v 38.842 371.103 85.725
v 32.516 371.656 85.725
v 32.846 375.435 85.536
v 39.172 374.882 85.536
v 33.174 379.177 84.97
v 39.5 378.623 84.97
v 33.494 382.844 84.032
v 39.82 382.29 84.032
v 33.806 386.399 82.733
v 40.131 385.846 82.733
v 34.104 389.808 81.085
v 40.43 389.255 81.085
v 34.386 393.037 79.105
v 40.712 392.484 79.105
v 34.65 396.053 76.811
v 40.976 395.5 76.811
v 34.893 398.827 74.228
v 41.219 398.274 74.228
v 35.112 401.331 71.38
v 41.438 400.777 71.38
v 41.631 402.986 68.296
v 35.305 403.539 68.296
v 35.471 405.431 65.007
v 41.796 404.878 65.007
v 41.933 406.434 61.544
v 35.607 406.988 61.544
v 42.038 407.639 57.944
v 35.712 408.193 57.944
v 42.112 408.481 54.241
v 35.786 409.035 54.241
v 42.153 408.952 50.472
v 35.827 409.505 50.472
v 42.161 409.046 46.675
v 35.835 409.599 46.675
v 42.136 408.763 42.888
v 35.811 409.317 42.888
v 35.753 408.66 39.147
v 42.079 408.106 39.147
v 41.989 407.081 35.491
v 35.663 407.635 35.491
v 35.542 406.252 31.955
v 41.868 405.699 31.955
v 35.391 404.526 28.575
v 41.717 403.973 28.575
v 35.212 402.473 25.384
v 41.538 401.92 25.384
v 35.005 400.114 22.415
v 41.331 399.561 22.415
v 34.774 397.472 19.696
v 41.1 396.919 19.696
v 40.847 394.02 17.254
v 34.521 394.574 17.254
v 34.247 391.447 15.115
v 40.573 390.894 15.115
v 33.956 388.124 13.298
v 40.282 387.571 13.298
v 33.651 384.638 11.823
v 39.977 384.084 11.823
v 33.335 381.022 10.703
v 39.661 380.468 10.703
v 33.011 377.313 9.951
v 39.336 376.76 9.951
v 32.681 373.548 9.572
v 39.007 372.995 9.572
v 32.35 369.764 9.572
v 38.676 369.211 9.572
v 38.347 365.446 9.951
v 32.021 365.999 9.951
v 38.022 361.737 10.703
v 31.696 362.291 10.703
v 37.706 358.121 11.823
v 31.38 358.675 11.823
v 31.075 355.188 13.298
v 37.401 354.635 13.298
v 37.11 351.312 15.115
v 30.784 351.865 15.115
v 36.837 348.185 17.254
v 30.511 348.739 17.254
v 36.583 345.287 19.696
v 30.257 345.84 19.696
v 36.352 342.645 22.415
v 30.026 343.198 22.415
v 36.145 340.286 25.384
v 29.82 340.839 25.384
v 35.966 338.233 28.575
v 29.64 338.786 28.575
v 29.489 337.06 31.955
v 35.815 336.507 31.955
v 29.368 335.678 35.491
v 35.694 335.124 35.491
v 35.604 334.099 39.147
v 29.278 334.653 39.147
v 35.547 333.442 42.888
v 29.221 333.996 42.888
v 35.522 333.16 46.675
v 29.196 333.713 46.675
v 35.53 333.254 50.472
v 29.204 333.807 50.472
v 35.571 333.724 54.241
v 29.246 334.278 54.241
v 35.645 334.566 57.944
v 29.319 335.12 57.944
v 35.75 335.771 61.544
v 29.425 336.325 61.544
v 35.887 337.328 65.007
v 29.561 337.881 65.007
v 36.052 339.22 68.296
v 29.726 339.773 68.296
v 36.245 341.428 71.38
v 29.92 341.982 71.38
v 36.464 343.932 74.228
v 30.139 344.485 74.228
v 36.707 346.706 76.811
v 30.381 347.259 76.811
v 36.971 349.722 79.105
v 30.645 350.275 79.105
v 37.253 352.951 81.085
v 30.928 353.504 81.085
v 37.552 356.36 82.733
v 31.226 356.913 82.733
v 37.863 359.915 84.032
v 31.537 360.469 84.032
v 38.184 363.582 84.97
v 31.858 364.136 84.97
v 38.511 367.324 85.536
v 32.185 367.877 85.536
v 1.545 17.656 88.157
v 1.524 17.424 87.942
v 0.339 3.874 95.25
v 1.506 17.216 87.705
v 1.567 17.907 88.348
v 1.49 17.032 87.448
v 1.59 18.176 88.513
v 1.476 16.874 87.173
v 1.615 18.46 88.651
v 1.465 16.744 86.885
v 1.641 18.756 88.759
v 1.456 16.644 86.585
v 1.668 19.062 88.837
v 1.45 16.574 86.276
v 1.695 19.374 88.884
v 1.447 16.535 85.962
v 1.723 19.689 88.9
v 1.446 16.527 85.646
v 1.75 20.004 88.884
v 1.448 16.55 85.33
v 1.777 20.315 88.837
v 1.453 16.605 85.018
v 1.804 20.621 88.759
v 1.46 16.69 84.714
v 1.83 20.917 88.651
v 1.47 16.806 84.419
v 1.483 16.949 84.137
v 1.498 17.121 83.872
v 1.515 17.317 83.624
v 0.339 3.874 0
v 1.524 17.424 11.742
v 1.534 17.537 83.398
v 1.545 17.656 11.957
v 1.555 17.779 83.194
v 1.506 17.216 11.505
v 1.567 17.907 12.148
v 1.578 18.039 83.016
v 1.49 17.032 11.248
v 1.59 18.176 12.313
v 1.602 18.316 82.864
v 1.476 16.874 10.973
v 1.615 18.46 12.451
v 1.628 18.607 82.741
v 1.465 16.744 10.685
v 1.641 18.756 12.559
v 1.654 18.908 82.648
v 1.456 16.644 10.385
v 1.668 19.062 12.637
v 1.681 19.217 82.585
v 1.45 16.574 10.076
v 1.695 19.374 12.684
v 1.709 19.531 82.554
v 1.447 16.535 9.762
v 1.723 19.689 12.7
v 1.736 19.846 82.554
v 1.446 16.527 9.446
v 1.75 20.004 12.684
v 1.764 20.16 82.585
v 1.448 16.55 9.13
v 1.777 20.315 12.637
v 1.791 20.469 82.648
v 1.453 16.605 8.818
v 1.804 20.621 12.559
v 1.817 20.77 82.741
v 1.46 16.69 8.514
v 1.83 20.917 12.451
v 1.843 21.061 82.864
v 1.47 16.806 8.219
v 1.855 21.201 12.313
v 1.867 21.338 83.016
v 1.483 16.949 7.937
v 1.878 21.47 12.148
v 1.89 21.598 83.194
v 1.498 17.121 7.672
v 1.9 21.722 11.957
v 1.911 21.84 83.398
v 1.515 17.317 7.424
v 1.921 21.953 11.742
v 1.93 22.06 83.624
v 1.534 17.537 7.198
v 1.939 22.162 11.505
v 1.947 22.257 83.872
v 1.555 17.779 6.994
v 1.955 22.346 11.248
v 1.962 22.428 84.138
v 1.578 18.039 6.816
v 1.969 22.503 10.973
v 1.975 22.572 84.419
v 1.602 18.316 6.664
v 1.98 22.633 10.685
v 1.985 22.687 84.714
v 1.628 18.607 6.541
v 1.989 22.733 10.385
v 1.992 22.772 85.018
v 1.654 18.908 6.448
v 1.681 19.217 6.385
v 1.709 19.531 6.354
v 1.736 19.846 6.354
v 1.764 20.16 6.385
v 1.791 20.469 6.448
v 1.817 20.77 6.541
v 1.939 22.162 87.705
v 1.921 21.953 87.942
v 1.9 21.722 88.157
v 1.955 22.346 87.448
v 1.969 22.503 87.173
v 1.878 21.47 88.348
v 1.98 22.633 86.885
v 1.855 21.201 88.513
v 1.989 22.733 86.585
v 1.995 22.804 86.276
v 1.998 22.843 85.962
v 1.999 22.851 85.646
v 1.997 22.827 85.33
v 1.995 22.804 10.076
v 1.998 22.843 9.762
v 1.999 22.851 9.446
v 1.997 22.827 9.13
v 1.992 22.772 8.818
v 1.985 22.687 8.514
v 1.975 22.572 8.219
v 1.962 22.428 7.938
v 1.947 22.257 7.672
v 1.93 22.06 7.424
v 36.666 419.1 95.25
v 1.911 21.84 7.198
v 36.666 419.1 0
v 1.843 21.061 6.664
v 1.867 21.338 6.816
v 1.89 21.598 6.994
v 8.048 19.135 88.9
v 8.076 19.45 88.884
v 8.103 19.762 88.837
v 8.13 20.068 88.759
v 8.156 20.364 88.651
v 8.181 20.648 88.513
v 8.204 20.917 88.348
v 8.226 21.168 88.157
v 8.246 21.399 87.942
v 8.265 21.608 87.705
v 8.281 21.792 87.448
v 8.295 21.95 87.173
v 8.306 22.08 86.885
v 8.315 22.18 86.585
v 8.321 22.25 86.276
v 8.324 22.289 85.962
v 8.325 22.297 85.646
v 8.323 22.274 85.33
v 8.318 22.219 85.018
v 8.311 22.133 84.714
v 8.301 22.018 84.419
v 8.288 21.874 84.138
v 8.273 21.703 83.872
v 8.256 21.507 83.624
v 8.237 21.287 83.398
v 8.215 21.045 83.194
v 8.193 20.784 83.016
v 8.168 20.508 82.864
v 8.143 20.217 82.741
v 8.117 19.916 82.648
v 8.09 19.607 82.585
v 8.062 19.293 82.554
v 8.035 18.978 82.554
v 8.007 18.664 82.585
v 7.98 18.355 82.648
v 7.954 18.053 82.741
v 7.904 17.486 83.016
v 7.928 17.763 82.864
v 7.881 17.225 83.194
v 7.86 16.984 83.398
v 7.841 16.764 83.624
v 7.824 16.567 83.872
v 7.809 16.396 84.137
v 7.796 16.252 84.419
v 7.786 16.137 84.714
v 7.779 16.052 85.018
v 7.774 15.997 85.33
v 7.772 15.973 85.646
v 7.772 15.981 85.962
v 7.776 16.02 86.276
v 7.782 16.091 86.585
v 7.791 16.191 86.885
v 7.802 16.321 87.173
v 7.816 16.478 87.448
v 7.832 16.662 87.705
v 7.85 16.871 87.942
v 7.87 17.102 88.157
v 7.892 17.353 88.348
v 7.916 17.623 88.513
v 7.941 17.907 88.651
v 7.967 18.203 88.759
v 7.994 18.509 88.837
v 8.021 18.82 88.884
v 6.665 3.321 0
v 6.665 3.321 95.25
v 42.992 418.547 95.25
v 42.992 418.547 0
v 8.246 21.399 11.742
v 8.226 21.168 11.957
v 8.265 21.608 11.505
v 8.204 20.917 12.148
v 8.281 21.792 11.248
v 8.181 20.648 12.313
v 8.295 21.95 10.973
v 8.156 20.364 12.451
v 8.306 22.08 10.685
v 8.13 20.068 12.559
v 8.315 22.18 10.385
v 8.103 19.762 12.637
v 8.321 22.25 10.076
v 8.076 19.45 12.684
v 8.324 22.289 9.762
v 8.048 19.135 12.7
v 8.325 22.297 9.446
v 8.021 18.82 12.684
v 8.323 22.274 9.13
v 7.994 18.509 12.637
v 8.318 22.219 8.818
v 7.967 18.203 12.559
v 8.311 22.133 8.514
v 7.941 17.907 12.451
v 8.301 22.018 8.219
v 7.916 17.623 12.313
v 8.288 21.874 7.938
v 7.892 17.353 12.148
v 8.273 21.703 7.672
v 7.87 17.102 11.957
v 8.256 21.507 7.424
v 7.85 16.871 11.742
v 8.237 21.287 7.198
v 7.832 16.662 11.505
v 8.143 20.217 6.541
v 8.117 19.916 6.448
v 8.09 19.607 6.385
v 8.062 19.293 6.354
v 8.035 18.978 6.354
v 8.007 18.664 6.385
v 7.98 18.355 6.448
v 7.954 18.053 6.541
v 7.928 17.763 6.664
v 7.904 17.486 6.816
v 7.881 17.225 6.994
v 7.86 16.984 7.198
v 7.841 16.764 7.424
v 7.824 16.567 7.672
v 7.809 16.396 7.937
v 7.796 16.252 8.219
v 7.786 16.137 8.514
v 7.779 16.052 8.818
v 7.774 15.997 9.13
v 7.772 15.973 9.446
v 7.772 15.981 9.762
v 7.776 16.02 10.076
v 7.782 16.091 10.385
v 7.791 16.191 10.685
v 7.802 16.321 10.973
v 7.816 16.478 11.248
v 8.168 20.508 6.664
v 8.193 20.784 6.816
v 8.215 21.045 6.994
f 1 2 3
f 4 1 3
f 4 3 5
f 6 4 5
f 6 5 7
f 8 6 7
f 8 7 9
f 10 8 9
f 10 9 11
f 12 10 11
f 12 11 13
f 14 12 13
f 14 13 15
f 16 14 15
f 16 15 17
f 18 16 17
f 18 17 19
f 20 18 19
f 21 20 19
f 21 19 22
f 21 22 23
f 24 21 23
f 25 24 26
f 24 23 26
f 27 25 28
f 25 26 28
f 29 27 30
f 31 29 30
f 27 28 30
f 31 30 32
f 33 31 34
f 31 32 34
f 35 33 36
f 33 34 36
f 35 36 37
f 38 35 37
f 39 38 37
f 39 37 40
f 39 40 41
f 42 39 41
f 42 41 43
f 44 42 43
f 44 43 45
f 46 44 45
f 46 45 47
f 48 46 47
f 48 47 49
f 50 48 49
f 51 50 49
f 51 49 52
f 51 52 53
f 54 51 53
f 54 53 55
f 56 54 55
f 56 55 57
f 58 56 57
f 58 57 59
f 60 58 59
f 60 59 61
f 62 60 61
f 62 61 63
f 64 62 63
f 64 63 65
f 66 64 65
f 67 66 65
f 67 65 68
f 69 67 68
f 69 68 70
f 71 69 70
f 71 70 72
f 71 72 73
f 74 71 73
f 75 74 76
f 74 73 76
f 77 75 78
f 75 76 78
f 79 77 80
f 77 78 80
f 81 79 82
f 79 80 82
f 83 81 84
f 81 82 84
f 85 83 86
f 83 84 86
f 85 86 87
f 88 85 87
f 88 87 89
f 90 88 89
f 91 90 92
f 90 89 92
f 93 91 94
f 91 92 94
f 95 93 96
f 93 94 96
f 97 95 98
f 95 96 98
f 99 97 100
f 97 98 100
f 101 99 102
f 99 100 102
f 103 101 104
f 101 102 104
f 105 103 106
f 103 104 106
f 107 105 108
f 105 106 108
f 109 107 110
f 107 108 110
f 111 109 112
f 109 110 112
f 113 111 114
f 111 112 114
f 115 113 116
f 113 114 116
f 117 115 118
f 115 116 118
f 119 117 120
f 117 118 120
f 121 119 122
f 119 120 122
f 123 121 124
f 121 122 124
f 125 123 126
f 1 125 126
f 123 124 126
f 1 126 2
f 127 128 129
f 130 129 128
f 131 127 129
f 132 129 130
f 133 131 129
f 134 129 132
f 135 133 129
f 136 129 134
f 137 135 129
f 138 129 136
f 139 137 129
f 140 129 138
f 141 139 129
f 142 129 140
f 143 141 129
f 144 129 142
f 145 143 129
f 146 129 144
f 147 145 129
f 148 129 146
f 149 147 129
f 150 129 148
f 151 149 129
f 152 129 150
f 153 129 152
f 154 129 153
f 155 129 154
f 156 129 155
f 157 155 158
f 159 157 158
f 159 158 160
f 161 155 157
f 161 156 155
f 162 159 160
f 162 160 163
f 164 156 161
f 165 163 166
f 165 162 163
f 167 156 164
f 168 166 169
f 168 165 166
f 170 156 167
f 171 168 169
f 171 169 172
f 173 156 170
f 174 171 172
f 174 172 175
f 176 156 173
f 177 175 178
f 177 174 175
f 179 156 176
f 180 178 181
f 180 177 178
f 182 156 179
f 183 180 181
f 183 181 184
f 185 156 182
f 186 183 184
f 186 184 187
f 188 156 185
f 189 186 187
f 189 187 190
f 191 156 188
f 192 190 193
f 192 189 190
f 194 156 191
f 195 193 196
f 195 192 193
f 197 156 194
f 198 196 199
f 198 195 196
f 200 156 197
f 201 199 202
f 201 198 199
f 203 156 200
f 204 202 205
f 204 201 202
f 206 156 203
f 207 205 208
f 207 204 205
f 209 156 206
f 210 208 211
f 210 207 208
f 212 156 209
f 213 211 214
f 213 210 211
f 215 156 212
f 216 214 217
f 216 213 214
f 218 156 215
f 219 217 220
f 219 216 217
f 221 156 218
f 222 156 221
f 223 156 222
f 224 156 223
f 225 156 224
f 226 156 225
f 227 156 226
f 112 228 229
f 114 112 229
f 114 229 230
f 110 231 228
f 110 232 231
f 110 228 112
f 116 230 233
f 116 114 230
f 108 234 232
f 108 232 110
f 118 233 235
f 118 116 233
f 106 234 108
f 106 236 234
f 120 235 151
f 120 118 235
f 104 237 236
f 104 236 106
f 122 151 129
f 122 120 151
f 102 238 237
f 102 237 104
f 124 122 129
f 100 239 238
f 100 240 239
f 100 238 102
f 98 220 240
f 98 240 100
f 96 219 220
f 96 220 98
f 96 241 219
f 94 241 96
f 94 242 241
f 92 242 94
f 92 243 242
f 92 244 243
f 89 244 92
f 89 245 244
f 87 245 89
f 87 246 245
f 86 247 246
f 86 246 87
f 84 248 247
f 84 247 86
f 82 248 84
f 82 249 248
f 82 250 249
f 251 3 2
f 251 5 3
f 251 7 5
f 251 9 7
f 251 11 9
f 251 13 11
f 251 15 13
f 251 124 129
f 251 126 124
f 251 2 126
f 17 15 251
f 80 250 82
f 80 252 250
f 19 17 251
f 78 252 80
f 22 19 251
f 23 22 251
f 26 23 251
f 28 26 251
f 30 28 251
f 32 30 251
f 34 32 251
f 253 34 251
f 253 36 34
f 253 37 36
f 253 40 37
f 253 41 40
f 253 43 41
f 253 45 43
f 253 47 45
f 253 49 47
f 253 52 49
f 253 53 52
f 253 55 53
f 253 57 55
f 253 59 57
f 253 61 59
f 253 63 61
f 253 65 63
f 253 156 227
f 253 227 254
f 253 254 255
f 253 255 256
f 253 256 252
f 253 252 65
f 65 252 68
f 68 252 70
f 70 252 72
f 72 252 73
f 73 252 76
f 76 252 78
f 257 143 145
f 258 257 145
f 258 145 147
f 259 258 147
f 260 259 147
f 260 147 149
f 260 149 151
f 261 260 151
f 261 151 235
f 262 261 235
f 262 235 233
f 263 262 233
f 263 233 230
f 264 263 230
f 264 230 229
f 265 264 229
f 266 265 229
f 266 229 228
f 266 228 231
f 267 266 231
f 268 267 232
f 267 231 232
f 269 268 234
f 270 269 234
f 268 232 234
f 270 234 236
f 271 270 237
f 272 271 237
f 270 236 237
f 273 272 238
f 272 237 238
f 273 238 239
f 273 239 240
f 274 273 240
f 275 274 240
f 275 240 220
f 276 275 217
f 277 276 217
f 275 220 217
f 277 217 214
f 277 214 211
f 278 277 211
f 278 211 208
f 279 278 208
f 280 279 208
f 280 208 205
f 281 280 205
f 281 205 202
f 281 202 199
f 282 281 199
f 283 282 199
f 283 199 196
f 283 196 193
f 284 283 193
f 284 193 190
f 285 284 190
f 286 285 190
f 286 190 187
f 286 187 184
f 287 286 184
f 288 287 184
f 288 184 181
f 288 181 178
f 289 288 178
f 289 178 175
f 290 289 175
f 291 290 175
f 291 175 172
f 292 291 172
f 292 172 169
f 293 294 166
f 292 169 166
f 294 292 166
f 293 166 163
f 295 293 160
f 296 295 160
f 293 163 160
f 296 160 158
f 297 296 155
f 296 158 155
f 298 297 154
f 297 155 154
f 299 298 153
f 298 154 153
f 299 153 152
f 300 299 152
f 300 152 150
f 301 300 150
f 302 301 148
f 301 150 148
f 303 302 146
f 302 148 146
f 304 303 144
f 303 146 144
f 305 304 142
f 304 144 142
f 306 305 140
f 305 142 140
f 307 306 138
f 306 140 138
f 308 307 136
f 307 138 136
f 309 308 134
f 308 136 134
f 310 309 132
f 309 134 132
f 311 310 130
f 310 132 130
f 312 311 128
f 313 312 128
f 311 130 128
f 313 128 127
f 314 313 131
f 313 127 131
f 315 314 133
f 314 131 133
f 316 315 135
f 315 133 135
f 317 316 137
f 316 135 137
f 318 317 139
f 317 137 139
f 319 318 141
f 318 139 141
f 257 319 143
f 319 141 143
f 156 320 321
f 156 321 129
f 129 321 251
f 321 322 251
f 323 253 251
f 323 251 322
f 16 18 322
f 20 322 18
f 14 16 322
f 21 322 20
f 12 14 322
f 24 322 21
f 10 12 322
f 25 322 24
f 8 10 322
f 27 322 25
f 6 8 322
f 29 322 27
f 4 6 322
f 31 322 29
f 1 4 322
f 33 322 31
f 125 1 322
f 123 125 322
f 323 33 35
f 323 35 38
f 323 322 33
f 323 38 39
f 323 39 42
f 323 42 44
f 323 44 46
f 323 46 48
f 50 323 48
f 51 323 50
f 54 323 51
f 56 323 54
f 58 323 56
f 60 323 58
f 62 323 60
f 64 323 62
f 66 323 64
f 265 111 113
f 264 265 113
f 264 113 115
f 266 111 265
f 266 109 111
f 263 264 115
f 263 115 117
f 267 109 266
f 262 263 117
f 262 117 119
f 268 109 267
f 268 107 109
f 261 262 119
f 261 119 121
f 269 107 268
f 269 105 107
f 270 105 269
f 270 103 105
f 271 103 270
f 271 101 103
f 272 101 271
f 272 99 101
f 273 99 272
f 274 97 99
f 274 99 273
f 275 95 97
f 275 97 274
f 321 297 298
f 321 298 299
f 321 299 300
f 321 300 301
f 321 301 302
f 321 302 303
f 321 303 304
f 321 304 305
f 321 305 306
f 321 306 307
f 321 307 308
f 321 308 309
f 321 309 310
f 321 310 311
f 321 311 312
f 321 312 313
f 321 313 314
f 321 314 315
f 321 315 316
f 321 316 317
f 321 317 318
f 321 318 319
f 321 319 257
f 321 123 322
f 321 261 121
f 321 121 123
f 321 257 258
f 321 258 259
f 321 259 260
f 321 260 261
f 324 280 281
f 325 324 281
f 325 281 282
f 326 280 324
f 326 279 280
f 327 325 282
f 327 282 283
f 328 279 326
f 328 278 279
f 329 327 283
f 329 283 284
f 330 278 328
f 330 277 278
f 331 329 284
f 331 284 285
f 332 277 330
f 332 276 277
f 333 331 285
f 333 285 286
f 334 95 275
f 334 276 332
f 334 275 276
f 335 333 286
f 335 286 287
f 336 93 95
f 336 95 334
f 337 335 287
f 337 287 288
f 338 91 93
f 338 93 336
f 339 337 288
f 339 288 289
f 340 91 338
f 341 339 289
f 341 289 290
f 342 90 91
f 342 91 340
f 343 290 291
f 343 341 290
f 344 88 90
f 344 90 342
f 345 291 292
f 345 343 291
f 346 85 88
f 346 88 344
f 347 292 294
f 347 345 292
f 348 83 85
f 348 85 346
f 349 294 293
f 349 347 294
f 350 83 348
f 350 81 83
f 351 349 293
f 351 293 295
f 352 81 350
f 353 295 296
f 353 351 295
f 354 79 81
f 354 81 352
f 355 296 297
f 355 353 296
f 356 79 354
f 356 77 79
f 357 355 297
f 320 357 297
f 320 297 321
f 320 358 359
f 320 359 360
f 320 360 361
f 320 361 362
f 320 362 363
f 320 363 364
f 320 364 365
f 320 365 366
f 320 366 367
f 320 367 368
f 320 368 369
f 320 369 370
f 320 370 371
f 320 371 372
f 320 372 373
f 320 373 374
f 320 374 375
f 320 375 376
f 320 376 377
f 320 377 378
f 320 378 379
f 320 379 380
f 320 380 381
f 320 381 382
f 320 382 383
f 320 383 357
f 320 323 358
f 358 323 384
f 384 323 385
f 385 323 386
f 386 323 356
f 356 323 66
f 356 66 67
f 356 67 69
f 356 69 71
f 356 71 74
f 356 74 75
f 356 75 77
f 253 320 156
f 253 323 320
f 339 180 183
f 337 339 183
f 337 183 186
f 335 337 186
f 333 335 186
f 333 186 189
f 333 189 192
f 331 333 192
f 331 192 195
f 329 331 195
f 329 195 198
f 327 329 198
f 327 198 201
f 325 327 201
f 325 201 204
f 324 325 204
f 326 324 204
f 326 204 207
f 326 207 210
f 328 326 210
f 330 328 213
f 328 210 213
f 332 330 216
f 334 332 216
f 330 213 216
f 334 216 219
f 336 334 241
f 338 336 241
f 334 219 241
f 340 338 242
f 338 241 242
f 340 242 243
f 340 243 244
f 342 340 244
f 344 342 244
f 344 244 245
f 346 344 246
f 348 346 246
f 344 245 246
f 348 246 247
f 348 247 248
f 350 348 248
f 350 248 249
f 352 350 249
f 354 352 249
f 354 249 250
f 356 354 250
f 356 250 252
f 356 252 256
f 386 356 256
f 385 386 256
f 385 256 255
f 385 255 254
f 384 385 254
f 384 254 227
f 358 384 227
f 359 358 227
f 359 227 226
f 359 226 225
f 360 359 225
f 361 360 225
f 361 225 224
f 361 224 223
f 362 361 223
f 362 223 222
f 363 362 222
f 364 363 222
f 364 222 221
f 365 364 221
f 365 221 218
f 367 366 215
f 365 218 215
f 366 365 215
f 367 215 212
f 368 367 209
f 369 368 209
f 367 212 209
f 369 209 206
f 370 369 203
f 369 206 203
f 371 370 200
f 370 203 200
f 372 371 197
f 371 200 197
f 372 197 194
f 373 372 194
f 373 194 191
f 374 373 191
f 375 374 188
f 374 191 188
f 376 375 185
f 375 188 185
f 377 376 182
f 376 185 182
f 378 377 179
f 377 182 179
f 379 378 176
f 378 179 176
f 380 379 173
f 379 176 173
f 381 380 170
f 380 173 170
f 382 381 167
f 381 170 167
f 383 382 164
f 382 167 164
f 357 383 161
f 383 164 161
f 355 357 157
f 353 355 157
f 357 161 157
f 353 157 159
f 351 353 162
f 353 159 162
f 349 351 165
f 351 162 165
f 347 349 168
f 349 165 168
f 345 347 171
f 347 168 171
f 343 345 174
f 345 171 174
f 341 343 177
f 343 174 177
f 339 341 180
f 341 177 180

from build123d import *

# Parameters (mm, degrees)
BOSS_EXTRUDE1_DEPTH = 95.25
SKETCH3_R           = 38.1
CUT_EXTRUDE1_DEPTH  = 43.539324096
SKETCH4_R           = 3.175
CUT_EXTRUDE2_DEPTH  = 43.539324096


with BuildPart() as part:
    # Sketch2 → Boss-Extrude1 (new body)
    with BuildSketch(Plane.XY):
        Polygon((6.664773782, 3.320633799), (0.338937449, 3.874072765), (36.666498884, 419.1), (42.992335217, 418.546561034), align=None)
    extrude(amount=BOSS_EXTRUDE1_DEPTH)

    # Sketch3 → Cut-Extrude1 (cut, through all)
    with BuildSketch(Plane(origin=(0, 0, 0), x_dir=(0, 0, 1), z_dir=(-0.996194698, 0.087155743, 0))):
        with Locations((47.625, 373.075893914)):
            Circle(SKETCH3_R)
    extrude(amount=-CUT_EXTRUDE1_DEPTH, mode=Mode.SUBTRACT)

    # Sketch4 → Cut-Extrude2 (cut, through all)
    with BuildSketch(Plane(origin=(0, 0, 0), x_dir=(0, 0, 1), z_dir=(-0.996194698, 0.087155743, 0))):
        with Locations((9.525, 19.763871094)):
            Circle(SKETCH4_R)
        with Locations((85.725, 19.763871094)):
            Circle(SKETCH4_R)
    extrude(amount=-CUT_EXTRUDE2_DEPTH, mode=Mode.SUBTRACT)


solid = part.part
